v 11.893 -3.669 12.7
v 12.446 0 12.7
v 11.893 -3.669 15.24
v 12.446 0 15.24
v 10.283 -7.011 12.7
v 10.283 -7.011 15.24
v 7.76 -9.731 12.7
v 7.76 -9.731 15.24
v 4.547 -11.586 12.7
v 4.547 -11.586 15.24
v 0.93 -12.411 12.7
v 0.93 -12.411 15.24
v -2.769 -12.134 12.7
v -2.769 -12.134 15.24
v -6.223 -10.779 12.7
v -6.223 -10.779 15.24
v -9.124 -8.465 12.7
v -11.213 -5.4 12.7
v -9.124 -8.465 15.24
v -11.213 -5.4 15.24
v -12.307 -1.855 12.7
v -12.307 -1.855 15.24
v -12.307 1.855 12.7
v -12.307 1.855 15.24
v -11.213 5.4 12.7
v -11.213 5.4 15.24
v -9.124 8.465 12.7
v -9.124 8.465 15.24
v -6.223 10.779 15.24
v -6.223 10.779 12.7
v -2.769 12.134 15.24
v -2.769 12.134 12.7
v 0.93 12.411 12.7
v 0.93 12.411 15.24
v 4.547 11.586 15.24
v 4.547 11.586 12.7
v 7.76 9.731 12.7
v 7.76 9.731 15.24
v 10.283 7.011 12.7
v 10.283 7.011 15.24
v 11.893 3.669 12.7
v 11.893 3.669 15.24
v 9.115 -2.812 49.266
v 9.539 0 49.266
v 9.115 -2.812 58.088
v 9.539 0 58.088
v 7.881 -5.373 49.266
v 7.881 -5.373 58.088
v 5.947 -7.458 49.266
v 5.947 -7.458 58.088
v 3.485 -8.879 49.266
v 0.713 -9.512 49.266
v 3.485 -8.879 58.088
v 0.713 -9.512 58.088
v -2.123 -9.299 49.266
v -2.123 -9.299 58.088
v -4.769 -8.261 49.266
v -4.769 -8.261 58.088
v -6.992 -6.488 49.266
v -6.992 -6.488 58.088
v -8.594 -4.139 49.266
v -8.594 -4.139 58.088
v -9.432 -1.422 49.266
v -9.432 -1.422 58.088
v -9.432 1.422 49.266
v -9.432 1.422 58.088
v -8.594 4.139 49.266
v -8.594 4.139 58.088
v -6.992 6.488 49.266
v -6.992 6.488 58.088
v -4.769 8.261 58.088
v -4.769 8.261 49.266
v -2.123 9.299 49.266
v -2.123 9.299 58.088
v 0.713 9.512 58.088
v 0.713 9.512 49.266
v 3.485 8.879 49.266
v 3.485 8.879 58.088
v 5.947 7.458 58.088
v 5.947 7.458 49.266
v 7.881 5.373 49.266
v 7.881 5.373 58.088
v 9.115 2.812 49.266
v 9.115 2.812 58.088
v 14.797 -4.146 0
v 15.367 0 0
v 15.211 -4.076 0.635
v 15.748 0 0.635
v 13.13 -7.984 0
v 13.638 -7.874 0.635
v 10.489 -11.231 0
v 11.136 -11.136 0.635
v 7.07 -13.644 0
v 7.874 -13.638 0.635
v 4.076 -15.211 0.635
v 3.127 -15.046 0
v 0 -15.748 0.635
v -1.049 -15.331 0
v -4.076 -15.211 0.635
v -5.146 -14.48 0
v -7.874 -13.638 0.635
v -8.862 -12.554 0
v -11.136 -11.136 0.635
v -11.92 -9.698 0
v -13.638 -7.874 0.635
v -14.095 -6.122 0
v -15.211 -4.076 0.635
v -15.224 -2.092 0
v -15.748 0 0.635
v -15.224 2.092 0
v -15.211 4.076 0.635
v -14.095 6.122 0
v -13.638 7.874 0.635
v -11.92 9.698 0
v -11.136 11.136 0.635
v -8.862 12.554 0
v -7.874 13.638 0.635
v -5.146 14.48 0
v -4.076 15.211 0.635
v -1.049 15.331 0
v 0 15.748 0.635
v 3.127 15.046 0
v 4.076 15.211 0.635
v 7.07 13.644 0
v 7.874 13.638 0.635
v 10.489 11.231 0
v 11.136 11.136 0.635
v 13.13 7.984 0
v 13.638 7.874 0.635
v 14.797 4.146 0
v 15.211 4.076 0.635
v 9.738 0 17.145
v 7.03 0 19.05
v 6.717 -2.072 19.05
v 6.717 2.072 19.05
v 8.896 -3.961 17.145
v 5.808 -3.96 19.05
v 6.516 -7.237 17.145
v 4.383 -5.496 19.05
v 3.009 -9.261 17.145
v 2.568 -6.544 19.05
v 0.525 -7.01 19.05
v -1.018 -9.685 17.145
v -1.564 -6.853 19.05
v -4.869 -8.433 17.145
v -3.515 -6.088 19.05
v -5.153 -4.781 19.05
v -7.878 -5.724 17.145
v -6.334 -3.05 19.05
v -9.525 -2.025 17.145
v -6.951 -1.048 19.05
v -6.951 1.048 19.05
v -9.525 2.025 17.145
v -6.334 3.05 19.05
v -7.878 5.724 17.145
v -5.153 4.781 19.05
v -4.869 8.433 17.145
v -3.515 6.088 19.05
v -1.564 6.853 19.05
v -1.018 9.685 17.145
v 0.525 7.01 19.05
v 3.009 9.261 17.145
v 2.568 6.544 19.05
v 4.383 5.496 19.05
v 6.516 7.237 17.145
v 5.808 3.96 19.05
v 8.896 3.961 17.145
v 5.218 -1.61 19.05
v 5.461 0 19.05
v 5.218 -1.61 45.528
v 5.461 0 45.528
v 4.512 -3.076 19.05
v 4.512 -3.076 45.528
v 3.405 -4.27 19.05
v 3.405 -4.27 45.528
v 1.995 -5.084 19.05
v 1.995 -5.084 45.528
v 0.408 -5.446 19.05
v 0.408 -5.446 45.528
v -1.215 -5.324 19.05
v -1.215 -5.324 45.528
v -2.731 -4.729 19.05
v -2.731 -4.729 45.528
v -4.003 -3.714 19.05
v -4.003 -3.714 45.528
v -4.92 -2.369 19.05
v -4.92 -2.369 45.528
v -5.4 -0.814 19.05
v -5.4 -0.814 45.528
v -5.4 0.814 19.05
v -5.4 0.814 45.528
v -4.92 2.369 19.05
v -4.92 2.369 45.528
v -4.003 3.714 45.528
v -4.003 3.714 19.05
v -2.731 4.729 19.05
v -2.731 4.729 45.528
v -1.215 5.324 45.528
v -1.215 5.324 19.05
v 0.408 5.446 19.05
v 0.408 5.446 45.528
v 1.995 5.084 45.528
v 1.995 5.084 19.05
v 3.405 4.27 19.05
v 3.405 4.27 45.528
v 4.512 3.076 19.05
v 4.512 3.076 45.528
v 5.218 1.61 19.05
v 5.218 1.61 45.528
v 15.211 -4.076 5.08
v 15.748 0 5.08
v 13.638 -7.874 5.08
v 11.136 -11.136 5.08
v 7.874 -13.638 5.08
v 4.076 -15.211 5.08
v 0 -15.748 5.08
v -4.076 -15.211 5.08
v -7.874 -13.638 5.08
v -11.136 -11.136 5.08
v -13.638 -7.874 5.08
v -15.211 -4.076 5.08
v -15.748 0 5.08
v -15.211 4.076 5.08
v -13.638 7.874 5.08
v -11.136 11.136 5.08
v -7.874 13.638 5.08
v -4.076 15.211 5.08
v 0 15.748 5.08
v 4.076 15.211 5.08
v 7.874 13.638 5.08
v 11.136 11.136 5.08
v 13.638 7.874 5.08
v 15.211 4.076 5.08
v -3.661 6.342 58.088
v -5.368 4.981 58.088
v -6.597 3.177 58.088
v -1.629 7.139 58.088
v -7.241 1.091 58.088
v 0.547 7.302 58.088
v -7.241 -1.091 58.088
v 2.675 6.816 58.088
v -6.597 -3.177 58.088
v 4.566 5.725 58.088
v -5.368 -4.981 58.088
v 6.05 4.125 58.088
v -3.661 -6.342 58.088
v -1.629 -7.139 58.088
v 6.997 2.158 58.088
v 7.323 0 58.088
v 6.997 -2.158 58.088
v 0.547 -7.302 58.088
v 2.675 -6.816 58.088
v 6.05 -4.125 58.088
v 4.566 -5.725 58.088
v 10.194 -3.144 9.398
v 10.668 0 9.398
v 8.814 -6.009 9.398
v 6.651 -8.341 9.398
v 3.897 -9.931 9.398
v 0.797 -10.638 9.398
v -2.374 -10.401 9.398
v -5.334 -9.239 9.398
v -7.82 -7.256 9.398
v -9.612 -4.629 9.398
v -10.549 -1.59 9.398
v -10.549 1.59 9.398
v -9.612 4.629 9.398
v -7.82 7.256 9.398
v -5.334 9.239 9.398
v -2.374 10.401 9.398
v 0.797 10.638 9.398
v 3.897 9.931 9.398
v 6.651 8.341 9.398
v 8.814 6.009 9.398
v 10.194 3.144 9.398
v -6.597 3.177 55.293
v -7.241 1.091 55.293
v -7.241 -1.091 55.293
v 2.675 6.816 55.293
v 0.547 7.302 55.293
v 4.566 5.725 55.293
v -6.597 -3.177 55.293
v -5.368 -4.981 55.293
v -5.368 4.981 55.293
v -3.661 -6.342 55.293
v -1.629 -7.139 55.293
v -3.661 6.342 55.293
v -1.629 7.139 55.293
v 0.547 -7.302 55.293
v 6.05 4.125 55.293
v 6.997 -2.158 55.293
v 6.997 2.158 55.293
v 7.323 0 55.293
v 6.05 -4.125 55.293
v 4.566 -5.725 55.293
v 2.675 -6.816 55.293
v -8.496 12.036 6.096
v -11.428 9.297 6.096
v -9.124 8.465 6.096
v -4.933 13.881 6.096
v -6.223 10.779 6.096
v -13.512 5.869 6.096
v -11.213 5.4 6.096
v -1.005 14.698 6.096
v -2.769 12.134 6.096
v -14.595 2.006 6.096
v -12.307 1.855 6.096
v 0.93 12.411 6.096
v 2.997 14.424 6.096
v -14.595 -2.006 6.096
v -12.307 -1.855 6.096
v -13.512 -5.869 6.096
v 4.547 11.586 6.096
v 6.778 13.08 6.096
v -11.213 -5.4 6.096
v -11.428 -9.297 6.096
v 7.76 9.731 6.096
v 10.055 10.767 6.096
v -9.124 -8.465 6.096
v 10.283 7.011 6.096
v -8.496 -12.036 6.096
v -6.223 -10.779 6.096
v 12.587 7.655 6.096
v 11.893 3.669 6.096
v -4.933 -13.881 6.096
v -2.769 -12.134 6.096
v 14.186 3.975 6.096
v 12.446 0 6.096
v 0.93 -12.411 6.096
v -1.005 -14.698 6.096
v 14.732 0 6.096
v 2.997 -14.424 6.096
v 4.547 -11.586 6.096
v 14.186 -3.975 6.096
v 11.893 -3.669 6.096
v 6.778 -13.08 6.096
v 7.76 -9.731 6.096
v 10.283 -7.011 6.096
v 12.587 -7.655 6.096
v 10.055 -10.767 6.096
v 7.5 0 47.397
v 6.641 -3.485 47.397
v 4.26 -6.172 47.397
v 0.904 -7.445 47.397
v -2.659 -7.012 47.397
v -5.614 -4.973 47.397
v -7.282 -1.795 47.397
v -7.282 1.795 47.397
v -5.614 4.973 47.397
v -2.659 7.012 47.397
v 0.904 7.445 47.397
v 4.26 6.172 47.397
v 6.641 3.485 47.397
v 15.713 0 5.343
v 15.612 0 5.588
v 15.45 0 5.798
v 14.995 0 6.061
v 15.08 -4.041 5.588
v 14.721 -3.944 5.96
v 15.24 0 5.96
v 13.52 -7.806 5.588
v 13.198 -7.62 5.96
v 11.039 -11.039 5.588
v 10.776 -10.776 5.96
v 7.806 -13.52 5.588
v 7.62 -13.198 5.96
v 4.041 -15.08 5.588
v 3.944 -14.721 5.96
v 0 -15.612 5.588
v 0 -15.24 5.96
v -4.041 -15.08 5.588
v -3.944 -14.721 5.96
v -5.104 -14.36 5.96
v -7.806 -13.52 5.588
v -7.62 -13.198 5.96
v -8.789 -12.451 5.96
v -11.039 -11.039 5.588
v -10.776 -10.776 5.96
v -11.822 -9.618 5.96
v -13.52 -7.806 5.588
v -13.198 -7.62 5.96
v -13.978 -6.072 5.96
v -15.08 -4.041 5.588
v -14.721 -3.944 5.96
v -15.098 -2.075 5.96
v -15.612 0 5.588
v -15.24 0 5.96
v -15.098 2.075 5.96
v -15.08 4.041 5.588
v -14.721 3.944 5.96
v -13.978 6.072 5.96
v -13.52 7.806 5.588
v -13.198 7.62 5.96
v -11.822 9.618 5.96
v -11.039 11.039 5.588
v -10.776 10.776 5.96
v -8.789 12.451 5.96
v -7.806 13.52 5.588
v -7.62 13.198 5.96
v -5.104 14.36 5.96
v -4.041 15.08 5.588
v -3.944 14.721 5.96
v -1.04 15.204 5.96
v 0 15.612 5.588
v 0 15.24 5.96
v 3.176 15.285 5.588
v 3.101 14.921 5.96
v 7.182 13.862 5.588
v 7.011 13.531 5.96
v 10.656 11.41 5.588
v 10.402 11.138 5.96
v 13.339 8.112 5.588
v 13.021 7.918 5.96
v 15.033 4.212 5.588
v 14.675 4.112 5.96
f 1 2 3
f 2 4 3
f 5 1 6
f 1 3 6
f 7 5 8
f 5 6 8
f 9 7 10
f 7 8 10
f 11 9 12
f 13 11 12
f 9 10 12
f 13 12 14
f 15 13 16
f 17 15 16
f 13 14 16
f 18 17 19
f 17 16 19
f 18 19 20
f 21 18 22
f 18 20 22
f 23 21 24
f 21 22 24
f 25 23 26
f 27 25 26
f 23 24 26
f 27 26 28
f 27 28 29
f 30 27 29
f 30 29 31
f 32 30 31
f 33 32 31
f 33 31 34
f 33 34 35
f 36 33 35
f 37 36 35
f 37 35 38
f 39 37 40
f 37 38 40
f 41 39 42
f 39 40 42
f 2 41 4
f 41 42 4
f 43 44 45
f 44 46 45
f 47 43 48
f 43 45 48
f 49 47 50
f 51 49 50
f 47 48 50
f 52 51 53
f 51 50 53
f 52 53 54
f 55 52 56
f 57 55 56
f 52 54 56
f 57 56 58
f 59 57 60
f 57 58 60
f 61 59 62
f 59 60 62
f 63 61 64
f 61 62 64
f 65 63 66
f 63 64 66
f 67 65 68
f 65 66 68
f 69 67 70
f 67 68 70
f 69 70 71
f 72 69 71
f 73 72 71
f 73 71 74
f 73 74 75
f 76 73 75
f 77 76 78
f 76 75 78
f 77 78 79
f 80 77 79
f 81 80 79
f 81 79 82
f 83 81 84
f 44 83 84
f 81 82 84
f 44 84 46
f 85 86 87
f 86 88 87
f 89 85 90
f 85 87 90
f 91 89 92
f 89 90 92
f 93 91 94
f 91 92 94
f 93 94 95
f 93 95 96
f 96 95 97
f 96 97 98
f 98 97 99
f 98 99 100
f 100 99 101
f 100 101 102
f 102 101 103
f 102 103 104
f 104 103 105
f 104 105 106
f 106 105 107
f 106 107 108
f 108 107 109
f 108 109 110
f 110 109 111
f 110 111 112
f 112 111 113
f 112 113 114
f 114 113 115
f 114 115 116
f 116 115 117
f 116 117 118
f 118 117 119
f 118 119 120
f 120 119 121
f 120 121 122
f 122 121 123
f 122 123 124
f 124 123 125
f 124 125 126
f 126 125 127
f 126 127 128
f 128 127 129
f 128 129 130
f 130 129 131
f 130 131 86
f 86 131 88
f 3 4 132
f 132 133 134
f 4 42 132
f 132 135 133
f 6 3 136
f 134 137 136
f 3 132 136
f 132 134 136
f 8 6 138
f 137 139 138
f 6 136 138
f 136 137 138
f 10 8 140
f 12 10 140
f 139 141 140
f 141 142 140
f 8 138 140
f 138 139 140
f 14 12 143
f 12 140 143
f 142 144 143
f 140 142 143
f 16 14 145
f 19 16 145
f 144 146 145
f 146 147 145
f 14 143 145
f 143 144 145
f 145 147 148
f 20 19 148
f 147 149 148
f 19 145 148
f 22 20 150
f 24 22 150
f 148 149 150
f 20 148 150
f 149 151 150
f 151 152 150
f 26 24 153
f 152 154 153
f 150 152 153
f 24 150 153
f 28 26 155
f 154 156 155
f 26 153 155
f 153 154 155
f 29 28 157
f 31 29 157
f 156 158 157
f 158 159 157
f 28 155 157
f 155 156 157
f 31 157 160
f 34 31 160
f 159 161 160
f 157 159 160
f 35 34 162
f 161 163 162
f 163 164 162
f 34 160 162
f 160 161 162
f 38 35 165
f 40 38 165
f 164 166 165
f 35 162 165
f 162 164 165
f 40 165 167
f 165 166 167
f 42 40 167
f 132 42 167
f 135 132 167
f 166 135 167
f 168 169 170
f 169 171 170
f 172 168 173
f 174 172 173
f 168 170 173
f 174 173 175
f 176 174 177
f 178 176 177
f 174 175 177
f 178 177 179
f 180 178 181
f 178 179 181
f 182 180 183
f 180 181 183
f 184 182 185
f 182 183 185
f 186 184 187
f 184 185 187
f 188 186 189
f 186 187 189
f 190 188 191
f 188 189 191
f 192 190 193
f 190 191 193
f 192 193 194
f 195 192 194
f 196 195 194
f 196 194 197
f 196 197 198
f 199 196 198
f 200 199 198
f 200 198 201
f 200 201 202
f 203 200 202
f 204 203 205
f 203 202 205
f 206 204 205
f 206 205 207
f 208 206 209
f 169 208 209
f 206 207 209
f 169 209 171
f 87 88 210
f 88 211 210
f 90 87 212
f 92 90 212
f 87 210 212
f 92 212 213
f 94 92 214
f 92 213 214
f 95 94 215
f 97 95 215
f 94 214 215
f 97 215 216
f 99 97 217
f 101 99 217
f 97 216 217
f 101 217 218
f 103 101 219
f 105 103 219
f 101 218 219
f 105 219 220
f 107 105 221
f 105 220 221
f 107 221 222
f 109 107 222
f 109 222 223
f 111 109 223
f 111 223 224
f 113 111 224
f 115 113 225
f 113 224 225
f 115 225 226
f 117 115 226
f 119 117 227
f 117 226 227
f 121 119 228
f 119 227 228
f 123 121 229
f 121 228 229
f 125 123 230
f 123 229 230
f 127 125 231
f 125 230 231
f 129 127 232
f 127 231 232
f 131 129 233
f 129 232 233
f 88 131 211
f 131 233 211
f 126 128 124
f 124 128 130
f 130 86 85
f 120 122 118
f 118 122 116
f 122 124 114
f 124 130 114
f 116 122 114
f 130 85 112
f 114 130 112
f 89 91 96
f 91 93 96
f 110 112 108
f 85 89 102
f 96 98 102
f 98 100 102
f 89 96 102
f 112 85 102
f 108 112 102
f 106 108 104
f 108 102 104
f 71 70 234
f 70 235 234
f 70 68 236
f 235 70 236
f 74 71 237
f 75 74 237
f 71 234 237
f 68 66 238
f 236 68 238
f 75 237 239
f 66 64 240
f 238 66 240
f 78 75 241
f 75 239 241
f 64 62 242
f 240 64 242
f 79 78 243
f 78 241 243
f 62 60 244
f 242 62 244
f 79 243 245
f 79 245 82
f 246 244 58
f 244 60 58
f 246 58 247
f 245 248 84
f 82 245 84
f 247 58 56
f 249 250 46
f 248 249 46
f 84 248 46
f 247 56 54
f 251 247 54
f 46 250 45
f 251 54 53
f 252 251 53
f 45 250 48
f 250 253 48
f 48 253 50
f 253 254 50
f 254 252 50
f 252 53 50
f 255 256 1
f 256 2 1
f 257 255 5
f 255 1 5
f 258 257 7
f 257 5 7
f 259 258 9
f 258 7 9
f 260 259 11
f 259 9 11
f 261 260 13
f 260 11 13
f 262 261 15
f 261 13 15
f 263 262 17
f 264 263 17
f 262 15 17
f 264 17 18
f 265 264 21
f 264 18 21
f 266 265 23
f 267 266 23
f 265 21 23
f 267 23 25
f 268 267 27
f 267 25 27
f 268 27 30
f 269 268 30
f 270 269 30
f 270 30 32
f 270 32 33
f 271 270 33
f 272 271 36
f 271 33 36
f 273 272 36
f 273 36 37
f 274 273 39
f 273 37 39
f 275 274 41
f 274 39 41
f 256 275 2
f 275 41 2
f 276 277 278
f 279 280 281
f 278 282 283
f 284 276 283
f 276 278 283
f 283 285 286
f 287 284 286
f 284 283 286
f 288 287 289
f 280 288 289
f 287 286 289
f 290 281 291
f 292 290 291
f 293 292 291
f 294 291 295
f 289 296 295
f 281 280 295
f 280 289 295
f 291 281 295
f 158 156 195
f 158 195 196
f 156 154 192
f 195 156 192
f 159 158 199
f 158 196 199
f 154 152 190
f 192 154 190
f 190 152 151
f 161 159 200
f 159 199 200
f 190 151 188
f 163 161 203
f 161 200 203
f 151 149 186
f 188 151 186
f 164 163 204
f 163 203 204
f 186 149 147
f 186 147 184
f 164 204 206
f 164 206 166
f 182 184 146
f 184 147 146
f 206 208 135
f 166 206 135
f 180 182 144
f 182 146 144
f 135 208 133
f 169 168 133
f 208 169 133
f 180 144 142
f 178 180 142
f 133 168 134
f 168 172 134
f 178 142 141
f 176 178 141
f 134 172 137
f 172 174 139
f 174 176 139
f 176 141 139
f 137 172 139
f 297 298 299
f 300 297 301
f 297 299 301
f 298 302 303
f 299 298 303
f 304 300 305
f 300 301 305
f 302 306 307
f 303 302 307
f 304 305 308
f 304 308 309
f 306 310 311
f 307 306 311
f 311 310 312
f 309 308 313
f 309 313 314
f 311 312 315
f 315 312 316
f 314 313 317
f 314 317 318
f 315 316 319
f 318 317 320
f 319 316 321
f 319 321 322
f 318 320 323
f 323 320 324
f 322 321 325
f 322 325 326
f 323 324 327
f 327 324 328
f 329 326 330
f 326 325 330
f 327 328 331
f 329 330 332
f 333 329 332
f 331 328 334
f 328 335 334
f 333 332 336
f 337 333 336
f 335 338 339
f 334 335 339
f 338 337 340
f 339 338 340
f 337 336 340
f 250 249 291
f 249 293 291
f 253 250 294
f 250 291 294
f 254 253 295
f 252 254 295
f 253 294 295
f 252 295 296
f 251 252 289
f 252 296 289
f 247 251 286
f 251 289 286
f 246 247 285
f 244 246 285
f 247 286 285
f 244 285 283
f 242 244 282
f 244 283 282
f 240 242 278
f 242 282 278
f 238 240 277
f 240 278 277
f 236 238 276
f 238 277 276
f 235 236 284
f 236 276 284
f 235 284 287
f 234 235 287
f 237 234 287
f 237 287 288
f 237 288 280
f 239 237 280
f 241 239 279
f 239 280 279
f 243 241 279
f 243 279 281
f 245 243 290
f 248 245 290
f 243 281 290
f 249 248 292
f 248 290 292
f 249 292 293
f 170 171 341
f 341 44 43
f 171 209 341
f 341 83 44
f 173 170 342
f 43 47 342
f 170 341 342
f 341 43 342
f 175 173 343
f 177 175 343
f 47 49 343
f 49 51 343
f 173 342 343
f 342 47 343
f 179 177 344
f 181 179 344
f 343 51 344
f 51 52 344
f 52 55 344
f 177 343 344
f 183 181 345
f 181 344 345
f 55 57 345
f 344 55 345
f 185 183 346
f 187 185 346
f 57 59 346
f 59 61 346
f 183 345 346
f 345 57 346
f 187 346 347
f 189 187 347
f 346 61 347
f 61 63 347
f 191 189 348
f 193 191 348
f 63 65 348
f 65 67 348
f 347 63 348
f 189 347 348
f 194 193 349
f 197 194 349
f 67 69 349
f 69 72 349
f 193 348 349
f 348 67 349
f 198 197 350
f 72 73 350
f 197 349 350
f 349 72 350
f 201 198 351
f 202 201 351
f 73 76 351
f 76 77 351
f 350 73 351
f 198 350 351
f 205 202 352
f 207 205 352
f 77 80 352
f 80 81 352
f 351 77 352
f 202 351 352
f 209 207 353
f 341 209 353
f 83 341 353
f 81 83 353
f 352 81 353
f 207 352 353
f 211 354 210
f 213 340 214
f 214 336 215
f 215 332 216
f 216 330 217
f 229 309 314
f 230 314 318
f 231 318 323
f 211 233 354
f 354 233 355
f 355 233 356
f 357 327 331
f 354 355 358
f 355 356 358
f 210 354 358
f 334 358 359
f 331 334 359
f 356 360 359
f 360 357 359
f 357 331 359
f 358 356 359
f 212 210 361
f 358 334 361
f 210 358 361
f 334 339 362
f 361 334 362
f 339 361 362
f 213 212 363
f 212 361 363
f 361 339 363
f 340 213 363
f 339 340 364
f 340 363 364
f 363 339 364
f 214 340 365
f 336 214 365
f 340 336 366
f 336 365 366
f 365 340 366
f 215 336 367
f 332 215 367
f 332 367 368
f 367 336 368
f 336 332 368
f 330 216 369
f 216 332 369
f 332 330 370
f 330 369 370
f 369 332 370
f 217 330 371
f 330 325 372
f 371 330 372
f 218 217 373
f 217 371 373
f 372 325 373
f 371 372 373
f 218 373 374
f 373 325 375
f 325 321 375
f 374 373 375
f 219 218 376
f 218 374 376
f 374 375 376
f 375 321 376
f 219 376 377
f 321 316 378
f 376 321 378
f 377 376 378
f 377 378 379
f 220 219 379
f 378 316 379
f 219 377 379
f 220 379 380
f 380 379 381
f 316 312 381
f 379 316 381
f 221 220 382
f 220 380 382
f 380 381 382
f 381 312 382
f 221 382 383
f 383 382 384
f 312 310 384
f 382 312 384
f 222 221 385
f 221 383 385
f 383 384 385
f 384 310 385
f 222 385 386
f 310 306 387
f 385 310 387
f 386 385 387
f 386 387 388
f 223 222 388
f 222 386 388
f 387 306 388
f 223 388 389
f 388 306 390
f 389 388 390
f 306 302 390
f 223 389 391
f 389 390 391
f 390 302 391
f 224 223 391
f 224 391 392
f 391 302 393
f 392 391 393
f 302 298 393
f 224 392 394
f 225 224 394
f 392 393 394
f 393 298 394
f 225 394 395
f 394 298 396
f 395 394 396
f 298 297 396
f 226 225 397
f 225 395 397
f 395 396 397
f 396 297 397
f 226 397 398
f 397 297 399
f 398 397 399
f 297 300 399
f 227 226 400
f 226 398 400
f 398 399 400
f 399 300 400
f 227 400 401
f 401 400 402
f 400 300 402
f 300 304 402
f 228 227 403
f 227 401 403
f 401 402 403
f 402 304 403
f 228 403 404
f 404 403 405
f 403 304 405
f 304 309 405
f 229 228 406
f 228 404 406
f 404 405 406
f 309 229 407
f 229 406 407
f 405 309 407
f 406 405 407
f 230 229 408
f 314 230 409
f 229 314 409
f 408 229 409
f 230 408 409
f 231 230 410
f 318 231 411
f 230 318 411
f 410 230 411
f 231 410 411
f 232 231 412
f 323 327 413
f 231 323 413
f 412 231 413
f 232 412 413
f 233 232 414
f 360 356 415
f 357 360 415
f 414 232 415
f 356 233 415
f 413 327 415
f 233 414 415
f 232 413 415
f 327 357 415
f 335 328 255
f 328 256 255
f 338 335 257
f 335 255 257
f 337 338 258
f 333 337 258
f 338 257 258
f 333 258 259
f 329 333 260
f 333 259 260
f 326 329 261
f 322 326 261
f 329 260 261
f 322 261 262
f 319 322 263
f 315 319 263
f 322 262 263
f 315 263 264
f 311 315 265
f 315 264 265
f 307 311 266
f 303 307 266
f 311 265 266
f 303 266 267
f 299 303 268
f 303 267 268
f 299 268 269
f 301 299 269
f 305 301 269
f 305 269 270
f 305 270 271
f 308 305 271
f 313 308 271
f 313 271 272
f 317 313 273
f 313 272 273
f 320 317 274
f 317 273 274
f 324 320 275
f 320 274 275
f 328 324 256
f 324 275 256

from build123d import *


with BuildPart() as f1:
    # F0 (on Front) → F1 (revolve)
    with BuildSketch(Plane.XZ):
        with BuildLine():
            Line((0, 0), (15.367, 0))
            Line((15.367, 0), (15.748, 0.635))
            Line((15.748, 0.635), (15.748, 5.08))
            ThreePointArc((15.748, 5.08), (15.45042, 5.79842), (14.732, 6.096))
            Line((14.732, 6.096), (12.446, 6.096))
            Line((12.446, 6.096), (10.668, 9.398))
            Line((10.668, 9.398), (12.446, 12.7))
            Line((12.446, 12.7), (12.446, 15.24))
            Line((12.446, 15.24), (7.029734, 19.05))
            Line((7.029734, 19.05), (5.461, 19.05))
            Line((5.461, 19.05), (5.461, 45.528467))
            Line((5.461, 45.528467), (9.538582, 49.266249))
            Line((9.538582, 49.266249), (9.538582, 58.08828))
            Line((9.538582, 58.08828), (7.322641, 58.08828))
            Line((7.322641, 58.08828), (7.322641, 55.292979))
            Line((7.322641, 55.292979), (0, 55.292979))
            Line((0, 55.292979), (0, 0))
        make_face()
    revolve(axis=Axis((0, 0, 27.646489), (0, 0, -1)))


solid = f1.part
